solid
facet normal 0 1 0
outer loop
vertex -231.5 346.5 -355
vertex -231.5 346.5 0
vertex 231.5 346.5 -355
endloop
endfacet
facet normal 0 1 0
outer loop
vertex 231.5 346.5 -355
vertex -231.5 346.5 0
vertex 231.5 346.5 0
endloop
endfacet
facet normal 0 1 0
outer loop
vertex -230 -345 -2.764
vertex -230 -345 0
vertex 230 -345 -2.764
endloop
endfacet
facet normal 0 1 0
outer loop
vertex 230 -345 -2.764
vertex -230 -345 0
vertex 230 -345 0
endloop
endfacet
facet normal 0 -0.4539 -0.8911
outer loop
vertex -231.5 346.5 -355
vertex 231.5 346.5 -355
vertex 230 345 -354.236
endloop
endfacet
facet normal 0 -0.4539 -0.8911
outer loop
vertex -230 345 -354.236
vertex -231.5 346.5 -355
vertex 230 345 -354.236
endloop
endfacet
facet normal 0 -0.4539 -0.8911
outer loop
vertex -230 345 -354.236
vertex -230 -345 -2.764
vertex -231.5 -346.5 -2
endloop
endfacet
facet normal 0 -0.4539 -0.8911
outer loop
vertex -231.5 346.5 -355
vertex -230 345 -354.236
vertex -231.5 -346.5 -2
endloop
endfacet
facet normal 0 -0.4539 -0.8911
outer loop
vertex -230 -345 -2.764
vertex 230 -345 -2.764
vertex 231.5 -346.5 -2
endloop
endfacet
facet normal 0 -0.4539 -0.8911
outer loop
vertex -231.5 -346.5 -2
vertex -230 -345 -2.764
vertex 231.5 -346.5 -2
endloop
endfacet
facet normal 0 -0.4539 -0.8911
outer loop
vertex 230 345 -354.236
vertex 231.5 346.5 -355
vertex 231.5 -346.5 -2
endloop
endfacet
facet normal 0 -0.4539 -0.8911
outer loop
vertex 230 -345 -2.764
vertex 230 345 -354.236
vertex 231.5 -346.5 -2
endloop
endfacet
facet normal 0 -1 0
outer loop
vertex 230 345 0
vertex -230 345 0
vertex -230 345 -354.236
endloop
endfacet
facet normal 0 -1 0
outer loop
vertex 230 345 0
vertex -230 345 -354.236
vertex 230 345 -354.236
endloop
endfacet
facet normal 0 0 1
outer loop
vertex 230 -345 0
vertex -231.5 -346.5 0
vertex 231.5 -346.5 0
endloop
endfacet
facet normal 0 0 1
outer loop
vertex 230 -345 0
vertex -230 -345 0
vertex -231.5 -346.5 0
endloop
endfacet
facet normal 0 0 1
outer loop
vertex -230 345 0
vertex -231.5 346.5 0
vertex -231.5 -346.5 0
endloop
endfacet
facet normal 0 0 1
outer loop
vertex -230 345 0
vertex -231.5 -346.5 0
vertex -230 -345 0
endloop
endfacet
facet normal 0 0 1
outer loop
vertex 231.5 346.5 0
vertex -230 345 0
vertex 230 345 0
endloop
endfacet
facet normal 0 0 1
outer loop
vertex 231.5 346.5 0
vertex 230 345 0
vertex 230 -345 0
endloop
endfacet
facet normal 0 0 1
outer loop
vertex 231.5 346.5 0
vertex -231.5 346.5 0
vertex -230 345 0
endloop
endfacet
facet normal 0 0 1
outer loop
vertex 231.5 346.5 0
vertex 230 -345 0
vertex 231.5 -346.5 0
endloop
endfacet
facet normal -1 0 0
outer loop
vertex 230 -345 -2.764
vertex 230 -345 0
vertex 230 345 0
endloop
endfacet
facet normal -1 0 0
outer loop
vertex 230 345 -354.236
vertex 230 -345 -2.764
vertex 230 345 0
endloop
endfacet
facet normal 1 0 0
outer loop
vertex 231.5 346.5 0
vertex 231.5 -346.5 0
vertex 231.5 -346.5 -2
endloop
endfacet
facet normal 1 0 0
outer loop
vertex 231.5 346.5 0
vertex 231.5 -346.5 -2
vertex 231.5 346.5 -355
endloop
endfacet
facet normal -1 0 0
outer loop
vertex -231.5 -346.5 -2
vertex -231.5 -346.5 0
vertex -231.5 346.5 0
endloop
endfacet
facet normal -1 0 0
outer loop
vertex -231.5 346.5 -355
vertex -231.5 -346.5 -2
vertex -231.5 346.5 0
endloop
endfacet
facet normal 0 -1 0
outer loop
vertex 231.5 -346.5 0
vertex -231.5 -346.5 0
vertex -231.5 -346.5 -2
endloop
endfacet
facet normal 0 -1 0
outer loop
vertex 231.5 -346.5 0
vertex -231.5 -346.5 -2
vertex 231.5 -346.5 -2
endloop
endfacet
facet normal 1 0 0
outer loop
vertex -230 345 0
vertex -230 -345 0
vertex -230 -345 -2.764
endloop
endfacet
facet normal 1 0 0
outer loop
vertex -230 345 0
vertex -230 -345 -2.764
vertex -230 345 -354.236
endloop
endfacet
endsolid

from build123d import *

# Parameters (mm, degrees)
F0_W     = 463
F0_H     = 693
F0_W_2   = 460
F0_H_2   = 690
F1_DEPTH = 355
F3_DEPTH = 463.001


with BuildPart() as f1:
    # F0 (on Top) → F1 (new body)
    with BuildSketch(Plane.XY):
        Rectangle(F0_W, F0_H)
        Rectangle(F0_W_2, F0_H_2, mode=Mode.SUBTRACT)
    extrude(amount=-F1_DEPTH)

    # F2 (on face) → F3 (cut, through all)
    with BuildSketch(Plane.YZ.offset(231.5)):
        Polygon((346.5, -355), (-346.5, -2), (-346.5, -355), align=None)
    extrude(amount=-F3_DEPTH, mode=Mode.SUBTRACT)


solid = f1.part
